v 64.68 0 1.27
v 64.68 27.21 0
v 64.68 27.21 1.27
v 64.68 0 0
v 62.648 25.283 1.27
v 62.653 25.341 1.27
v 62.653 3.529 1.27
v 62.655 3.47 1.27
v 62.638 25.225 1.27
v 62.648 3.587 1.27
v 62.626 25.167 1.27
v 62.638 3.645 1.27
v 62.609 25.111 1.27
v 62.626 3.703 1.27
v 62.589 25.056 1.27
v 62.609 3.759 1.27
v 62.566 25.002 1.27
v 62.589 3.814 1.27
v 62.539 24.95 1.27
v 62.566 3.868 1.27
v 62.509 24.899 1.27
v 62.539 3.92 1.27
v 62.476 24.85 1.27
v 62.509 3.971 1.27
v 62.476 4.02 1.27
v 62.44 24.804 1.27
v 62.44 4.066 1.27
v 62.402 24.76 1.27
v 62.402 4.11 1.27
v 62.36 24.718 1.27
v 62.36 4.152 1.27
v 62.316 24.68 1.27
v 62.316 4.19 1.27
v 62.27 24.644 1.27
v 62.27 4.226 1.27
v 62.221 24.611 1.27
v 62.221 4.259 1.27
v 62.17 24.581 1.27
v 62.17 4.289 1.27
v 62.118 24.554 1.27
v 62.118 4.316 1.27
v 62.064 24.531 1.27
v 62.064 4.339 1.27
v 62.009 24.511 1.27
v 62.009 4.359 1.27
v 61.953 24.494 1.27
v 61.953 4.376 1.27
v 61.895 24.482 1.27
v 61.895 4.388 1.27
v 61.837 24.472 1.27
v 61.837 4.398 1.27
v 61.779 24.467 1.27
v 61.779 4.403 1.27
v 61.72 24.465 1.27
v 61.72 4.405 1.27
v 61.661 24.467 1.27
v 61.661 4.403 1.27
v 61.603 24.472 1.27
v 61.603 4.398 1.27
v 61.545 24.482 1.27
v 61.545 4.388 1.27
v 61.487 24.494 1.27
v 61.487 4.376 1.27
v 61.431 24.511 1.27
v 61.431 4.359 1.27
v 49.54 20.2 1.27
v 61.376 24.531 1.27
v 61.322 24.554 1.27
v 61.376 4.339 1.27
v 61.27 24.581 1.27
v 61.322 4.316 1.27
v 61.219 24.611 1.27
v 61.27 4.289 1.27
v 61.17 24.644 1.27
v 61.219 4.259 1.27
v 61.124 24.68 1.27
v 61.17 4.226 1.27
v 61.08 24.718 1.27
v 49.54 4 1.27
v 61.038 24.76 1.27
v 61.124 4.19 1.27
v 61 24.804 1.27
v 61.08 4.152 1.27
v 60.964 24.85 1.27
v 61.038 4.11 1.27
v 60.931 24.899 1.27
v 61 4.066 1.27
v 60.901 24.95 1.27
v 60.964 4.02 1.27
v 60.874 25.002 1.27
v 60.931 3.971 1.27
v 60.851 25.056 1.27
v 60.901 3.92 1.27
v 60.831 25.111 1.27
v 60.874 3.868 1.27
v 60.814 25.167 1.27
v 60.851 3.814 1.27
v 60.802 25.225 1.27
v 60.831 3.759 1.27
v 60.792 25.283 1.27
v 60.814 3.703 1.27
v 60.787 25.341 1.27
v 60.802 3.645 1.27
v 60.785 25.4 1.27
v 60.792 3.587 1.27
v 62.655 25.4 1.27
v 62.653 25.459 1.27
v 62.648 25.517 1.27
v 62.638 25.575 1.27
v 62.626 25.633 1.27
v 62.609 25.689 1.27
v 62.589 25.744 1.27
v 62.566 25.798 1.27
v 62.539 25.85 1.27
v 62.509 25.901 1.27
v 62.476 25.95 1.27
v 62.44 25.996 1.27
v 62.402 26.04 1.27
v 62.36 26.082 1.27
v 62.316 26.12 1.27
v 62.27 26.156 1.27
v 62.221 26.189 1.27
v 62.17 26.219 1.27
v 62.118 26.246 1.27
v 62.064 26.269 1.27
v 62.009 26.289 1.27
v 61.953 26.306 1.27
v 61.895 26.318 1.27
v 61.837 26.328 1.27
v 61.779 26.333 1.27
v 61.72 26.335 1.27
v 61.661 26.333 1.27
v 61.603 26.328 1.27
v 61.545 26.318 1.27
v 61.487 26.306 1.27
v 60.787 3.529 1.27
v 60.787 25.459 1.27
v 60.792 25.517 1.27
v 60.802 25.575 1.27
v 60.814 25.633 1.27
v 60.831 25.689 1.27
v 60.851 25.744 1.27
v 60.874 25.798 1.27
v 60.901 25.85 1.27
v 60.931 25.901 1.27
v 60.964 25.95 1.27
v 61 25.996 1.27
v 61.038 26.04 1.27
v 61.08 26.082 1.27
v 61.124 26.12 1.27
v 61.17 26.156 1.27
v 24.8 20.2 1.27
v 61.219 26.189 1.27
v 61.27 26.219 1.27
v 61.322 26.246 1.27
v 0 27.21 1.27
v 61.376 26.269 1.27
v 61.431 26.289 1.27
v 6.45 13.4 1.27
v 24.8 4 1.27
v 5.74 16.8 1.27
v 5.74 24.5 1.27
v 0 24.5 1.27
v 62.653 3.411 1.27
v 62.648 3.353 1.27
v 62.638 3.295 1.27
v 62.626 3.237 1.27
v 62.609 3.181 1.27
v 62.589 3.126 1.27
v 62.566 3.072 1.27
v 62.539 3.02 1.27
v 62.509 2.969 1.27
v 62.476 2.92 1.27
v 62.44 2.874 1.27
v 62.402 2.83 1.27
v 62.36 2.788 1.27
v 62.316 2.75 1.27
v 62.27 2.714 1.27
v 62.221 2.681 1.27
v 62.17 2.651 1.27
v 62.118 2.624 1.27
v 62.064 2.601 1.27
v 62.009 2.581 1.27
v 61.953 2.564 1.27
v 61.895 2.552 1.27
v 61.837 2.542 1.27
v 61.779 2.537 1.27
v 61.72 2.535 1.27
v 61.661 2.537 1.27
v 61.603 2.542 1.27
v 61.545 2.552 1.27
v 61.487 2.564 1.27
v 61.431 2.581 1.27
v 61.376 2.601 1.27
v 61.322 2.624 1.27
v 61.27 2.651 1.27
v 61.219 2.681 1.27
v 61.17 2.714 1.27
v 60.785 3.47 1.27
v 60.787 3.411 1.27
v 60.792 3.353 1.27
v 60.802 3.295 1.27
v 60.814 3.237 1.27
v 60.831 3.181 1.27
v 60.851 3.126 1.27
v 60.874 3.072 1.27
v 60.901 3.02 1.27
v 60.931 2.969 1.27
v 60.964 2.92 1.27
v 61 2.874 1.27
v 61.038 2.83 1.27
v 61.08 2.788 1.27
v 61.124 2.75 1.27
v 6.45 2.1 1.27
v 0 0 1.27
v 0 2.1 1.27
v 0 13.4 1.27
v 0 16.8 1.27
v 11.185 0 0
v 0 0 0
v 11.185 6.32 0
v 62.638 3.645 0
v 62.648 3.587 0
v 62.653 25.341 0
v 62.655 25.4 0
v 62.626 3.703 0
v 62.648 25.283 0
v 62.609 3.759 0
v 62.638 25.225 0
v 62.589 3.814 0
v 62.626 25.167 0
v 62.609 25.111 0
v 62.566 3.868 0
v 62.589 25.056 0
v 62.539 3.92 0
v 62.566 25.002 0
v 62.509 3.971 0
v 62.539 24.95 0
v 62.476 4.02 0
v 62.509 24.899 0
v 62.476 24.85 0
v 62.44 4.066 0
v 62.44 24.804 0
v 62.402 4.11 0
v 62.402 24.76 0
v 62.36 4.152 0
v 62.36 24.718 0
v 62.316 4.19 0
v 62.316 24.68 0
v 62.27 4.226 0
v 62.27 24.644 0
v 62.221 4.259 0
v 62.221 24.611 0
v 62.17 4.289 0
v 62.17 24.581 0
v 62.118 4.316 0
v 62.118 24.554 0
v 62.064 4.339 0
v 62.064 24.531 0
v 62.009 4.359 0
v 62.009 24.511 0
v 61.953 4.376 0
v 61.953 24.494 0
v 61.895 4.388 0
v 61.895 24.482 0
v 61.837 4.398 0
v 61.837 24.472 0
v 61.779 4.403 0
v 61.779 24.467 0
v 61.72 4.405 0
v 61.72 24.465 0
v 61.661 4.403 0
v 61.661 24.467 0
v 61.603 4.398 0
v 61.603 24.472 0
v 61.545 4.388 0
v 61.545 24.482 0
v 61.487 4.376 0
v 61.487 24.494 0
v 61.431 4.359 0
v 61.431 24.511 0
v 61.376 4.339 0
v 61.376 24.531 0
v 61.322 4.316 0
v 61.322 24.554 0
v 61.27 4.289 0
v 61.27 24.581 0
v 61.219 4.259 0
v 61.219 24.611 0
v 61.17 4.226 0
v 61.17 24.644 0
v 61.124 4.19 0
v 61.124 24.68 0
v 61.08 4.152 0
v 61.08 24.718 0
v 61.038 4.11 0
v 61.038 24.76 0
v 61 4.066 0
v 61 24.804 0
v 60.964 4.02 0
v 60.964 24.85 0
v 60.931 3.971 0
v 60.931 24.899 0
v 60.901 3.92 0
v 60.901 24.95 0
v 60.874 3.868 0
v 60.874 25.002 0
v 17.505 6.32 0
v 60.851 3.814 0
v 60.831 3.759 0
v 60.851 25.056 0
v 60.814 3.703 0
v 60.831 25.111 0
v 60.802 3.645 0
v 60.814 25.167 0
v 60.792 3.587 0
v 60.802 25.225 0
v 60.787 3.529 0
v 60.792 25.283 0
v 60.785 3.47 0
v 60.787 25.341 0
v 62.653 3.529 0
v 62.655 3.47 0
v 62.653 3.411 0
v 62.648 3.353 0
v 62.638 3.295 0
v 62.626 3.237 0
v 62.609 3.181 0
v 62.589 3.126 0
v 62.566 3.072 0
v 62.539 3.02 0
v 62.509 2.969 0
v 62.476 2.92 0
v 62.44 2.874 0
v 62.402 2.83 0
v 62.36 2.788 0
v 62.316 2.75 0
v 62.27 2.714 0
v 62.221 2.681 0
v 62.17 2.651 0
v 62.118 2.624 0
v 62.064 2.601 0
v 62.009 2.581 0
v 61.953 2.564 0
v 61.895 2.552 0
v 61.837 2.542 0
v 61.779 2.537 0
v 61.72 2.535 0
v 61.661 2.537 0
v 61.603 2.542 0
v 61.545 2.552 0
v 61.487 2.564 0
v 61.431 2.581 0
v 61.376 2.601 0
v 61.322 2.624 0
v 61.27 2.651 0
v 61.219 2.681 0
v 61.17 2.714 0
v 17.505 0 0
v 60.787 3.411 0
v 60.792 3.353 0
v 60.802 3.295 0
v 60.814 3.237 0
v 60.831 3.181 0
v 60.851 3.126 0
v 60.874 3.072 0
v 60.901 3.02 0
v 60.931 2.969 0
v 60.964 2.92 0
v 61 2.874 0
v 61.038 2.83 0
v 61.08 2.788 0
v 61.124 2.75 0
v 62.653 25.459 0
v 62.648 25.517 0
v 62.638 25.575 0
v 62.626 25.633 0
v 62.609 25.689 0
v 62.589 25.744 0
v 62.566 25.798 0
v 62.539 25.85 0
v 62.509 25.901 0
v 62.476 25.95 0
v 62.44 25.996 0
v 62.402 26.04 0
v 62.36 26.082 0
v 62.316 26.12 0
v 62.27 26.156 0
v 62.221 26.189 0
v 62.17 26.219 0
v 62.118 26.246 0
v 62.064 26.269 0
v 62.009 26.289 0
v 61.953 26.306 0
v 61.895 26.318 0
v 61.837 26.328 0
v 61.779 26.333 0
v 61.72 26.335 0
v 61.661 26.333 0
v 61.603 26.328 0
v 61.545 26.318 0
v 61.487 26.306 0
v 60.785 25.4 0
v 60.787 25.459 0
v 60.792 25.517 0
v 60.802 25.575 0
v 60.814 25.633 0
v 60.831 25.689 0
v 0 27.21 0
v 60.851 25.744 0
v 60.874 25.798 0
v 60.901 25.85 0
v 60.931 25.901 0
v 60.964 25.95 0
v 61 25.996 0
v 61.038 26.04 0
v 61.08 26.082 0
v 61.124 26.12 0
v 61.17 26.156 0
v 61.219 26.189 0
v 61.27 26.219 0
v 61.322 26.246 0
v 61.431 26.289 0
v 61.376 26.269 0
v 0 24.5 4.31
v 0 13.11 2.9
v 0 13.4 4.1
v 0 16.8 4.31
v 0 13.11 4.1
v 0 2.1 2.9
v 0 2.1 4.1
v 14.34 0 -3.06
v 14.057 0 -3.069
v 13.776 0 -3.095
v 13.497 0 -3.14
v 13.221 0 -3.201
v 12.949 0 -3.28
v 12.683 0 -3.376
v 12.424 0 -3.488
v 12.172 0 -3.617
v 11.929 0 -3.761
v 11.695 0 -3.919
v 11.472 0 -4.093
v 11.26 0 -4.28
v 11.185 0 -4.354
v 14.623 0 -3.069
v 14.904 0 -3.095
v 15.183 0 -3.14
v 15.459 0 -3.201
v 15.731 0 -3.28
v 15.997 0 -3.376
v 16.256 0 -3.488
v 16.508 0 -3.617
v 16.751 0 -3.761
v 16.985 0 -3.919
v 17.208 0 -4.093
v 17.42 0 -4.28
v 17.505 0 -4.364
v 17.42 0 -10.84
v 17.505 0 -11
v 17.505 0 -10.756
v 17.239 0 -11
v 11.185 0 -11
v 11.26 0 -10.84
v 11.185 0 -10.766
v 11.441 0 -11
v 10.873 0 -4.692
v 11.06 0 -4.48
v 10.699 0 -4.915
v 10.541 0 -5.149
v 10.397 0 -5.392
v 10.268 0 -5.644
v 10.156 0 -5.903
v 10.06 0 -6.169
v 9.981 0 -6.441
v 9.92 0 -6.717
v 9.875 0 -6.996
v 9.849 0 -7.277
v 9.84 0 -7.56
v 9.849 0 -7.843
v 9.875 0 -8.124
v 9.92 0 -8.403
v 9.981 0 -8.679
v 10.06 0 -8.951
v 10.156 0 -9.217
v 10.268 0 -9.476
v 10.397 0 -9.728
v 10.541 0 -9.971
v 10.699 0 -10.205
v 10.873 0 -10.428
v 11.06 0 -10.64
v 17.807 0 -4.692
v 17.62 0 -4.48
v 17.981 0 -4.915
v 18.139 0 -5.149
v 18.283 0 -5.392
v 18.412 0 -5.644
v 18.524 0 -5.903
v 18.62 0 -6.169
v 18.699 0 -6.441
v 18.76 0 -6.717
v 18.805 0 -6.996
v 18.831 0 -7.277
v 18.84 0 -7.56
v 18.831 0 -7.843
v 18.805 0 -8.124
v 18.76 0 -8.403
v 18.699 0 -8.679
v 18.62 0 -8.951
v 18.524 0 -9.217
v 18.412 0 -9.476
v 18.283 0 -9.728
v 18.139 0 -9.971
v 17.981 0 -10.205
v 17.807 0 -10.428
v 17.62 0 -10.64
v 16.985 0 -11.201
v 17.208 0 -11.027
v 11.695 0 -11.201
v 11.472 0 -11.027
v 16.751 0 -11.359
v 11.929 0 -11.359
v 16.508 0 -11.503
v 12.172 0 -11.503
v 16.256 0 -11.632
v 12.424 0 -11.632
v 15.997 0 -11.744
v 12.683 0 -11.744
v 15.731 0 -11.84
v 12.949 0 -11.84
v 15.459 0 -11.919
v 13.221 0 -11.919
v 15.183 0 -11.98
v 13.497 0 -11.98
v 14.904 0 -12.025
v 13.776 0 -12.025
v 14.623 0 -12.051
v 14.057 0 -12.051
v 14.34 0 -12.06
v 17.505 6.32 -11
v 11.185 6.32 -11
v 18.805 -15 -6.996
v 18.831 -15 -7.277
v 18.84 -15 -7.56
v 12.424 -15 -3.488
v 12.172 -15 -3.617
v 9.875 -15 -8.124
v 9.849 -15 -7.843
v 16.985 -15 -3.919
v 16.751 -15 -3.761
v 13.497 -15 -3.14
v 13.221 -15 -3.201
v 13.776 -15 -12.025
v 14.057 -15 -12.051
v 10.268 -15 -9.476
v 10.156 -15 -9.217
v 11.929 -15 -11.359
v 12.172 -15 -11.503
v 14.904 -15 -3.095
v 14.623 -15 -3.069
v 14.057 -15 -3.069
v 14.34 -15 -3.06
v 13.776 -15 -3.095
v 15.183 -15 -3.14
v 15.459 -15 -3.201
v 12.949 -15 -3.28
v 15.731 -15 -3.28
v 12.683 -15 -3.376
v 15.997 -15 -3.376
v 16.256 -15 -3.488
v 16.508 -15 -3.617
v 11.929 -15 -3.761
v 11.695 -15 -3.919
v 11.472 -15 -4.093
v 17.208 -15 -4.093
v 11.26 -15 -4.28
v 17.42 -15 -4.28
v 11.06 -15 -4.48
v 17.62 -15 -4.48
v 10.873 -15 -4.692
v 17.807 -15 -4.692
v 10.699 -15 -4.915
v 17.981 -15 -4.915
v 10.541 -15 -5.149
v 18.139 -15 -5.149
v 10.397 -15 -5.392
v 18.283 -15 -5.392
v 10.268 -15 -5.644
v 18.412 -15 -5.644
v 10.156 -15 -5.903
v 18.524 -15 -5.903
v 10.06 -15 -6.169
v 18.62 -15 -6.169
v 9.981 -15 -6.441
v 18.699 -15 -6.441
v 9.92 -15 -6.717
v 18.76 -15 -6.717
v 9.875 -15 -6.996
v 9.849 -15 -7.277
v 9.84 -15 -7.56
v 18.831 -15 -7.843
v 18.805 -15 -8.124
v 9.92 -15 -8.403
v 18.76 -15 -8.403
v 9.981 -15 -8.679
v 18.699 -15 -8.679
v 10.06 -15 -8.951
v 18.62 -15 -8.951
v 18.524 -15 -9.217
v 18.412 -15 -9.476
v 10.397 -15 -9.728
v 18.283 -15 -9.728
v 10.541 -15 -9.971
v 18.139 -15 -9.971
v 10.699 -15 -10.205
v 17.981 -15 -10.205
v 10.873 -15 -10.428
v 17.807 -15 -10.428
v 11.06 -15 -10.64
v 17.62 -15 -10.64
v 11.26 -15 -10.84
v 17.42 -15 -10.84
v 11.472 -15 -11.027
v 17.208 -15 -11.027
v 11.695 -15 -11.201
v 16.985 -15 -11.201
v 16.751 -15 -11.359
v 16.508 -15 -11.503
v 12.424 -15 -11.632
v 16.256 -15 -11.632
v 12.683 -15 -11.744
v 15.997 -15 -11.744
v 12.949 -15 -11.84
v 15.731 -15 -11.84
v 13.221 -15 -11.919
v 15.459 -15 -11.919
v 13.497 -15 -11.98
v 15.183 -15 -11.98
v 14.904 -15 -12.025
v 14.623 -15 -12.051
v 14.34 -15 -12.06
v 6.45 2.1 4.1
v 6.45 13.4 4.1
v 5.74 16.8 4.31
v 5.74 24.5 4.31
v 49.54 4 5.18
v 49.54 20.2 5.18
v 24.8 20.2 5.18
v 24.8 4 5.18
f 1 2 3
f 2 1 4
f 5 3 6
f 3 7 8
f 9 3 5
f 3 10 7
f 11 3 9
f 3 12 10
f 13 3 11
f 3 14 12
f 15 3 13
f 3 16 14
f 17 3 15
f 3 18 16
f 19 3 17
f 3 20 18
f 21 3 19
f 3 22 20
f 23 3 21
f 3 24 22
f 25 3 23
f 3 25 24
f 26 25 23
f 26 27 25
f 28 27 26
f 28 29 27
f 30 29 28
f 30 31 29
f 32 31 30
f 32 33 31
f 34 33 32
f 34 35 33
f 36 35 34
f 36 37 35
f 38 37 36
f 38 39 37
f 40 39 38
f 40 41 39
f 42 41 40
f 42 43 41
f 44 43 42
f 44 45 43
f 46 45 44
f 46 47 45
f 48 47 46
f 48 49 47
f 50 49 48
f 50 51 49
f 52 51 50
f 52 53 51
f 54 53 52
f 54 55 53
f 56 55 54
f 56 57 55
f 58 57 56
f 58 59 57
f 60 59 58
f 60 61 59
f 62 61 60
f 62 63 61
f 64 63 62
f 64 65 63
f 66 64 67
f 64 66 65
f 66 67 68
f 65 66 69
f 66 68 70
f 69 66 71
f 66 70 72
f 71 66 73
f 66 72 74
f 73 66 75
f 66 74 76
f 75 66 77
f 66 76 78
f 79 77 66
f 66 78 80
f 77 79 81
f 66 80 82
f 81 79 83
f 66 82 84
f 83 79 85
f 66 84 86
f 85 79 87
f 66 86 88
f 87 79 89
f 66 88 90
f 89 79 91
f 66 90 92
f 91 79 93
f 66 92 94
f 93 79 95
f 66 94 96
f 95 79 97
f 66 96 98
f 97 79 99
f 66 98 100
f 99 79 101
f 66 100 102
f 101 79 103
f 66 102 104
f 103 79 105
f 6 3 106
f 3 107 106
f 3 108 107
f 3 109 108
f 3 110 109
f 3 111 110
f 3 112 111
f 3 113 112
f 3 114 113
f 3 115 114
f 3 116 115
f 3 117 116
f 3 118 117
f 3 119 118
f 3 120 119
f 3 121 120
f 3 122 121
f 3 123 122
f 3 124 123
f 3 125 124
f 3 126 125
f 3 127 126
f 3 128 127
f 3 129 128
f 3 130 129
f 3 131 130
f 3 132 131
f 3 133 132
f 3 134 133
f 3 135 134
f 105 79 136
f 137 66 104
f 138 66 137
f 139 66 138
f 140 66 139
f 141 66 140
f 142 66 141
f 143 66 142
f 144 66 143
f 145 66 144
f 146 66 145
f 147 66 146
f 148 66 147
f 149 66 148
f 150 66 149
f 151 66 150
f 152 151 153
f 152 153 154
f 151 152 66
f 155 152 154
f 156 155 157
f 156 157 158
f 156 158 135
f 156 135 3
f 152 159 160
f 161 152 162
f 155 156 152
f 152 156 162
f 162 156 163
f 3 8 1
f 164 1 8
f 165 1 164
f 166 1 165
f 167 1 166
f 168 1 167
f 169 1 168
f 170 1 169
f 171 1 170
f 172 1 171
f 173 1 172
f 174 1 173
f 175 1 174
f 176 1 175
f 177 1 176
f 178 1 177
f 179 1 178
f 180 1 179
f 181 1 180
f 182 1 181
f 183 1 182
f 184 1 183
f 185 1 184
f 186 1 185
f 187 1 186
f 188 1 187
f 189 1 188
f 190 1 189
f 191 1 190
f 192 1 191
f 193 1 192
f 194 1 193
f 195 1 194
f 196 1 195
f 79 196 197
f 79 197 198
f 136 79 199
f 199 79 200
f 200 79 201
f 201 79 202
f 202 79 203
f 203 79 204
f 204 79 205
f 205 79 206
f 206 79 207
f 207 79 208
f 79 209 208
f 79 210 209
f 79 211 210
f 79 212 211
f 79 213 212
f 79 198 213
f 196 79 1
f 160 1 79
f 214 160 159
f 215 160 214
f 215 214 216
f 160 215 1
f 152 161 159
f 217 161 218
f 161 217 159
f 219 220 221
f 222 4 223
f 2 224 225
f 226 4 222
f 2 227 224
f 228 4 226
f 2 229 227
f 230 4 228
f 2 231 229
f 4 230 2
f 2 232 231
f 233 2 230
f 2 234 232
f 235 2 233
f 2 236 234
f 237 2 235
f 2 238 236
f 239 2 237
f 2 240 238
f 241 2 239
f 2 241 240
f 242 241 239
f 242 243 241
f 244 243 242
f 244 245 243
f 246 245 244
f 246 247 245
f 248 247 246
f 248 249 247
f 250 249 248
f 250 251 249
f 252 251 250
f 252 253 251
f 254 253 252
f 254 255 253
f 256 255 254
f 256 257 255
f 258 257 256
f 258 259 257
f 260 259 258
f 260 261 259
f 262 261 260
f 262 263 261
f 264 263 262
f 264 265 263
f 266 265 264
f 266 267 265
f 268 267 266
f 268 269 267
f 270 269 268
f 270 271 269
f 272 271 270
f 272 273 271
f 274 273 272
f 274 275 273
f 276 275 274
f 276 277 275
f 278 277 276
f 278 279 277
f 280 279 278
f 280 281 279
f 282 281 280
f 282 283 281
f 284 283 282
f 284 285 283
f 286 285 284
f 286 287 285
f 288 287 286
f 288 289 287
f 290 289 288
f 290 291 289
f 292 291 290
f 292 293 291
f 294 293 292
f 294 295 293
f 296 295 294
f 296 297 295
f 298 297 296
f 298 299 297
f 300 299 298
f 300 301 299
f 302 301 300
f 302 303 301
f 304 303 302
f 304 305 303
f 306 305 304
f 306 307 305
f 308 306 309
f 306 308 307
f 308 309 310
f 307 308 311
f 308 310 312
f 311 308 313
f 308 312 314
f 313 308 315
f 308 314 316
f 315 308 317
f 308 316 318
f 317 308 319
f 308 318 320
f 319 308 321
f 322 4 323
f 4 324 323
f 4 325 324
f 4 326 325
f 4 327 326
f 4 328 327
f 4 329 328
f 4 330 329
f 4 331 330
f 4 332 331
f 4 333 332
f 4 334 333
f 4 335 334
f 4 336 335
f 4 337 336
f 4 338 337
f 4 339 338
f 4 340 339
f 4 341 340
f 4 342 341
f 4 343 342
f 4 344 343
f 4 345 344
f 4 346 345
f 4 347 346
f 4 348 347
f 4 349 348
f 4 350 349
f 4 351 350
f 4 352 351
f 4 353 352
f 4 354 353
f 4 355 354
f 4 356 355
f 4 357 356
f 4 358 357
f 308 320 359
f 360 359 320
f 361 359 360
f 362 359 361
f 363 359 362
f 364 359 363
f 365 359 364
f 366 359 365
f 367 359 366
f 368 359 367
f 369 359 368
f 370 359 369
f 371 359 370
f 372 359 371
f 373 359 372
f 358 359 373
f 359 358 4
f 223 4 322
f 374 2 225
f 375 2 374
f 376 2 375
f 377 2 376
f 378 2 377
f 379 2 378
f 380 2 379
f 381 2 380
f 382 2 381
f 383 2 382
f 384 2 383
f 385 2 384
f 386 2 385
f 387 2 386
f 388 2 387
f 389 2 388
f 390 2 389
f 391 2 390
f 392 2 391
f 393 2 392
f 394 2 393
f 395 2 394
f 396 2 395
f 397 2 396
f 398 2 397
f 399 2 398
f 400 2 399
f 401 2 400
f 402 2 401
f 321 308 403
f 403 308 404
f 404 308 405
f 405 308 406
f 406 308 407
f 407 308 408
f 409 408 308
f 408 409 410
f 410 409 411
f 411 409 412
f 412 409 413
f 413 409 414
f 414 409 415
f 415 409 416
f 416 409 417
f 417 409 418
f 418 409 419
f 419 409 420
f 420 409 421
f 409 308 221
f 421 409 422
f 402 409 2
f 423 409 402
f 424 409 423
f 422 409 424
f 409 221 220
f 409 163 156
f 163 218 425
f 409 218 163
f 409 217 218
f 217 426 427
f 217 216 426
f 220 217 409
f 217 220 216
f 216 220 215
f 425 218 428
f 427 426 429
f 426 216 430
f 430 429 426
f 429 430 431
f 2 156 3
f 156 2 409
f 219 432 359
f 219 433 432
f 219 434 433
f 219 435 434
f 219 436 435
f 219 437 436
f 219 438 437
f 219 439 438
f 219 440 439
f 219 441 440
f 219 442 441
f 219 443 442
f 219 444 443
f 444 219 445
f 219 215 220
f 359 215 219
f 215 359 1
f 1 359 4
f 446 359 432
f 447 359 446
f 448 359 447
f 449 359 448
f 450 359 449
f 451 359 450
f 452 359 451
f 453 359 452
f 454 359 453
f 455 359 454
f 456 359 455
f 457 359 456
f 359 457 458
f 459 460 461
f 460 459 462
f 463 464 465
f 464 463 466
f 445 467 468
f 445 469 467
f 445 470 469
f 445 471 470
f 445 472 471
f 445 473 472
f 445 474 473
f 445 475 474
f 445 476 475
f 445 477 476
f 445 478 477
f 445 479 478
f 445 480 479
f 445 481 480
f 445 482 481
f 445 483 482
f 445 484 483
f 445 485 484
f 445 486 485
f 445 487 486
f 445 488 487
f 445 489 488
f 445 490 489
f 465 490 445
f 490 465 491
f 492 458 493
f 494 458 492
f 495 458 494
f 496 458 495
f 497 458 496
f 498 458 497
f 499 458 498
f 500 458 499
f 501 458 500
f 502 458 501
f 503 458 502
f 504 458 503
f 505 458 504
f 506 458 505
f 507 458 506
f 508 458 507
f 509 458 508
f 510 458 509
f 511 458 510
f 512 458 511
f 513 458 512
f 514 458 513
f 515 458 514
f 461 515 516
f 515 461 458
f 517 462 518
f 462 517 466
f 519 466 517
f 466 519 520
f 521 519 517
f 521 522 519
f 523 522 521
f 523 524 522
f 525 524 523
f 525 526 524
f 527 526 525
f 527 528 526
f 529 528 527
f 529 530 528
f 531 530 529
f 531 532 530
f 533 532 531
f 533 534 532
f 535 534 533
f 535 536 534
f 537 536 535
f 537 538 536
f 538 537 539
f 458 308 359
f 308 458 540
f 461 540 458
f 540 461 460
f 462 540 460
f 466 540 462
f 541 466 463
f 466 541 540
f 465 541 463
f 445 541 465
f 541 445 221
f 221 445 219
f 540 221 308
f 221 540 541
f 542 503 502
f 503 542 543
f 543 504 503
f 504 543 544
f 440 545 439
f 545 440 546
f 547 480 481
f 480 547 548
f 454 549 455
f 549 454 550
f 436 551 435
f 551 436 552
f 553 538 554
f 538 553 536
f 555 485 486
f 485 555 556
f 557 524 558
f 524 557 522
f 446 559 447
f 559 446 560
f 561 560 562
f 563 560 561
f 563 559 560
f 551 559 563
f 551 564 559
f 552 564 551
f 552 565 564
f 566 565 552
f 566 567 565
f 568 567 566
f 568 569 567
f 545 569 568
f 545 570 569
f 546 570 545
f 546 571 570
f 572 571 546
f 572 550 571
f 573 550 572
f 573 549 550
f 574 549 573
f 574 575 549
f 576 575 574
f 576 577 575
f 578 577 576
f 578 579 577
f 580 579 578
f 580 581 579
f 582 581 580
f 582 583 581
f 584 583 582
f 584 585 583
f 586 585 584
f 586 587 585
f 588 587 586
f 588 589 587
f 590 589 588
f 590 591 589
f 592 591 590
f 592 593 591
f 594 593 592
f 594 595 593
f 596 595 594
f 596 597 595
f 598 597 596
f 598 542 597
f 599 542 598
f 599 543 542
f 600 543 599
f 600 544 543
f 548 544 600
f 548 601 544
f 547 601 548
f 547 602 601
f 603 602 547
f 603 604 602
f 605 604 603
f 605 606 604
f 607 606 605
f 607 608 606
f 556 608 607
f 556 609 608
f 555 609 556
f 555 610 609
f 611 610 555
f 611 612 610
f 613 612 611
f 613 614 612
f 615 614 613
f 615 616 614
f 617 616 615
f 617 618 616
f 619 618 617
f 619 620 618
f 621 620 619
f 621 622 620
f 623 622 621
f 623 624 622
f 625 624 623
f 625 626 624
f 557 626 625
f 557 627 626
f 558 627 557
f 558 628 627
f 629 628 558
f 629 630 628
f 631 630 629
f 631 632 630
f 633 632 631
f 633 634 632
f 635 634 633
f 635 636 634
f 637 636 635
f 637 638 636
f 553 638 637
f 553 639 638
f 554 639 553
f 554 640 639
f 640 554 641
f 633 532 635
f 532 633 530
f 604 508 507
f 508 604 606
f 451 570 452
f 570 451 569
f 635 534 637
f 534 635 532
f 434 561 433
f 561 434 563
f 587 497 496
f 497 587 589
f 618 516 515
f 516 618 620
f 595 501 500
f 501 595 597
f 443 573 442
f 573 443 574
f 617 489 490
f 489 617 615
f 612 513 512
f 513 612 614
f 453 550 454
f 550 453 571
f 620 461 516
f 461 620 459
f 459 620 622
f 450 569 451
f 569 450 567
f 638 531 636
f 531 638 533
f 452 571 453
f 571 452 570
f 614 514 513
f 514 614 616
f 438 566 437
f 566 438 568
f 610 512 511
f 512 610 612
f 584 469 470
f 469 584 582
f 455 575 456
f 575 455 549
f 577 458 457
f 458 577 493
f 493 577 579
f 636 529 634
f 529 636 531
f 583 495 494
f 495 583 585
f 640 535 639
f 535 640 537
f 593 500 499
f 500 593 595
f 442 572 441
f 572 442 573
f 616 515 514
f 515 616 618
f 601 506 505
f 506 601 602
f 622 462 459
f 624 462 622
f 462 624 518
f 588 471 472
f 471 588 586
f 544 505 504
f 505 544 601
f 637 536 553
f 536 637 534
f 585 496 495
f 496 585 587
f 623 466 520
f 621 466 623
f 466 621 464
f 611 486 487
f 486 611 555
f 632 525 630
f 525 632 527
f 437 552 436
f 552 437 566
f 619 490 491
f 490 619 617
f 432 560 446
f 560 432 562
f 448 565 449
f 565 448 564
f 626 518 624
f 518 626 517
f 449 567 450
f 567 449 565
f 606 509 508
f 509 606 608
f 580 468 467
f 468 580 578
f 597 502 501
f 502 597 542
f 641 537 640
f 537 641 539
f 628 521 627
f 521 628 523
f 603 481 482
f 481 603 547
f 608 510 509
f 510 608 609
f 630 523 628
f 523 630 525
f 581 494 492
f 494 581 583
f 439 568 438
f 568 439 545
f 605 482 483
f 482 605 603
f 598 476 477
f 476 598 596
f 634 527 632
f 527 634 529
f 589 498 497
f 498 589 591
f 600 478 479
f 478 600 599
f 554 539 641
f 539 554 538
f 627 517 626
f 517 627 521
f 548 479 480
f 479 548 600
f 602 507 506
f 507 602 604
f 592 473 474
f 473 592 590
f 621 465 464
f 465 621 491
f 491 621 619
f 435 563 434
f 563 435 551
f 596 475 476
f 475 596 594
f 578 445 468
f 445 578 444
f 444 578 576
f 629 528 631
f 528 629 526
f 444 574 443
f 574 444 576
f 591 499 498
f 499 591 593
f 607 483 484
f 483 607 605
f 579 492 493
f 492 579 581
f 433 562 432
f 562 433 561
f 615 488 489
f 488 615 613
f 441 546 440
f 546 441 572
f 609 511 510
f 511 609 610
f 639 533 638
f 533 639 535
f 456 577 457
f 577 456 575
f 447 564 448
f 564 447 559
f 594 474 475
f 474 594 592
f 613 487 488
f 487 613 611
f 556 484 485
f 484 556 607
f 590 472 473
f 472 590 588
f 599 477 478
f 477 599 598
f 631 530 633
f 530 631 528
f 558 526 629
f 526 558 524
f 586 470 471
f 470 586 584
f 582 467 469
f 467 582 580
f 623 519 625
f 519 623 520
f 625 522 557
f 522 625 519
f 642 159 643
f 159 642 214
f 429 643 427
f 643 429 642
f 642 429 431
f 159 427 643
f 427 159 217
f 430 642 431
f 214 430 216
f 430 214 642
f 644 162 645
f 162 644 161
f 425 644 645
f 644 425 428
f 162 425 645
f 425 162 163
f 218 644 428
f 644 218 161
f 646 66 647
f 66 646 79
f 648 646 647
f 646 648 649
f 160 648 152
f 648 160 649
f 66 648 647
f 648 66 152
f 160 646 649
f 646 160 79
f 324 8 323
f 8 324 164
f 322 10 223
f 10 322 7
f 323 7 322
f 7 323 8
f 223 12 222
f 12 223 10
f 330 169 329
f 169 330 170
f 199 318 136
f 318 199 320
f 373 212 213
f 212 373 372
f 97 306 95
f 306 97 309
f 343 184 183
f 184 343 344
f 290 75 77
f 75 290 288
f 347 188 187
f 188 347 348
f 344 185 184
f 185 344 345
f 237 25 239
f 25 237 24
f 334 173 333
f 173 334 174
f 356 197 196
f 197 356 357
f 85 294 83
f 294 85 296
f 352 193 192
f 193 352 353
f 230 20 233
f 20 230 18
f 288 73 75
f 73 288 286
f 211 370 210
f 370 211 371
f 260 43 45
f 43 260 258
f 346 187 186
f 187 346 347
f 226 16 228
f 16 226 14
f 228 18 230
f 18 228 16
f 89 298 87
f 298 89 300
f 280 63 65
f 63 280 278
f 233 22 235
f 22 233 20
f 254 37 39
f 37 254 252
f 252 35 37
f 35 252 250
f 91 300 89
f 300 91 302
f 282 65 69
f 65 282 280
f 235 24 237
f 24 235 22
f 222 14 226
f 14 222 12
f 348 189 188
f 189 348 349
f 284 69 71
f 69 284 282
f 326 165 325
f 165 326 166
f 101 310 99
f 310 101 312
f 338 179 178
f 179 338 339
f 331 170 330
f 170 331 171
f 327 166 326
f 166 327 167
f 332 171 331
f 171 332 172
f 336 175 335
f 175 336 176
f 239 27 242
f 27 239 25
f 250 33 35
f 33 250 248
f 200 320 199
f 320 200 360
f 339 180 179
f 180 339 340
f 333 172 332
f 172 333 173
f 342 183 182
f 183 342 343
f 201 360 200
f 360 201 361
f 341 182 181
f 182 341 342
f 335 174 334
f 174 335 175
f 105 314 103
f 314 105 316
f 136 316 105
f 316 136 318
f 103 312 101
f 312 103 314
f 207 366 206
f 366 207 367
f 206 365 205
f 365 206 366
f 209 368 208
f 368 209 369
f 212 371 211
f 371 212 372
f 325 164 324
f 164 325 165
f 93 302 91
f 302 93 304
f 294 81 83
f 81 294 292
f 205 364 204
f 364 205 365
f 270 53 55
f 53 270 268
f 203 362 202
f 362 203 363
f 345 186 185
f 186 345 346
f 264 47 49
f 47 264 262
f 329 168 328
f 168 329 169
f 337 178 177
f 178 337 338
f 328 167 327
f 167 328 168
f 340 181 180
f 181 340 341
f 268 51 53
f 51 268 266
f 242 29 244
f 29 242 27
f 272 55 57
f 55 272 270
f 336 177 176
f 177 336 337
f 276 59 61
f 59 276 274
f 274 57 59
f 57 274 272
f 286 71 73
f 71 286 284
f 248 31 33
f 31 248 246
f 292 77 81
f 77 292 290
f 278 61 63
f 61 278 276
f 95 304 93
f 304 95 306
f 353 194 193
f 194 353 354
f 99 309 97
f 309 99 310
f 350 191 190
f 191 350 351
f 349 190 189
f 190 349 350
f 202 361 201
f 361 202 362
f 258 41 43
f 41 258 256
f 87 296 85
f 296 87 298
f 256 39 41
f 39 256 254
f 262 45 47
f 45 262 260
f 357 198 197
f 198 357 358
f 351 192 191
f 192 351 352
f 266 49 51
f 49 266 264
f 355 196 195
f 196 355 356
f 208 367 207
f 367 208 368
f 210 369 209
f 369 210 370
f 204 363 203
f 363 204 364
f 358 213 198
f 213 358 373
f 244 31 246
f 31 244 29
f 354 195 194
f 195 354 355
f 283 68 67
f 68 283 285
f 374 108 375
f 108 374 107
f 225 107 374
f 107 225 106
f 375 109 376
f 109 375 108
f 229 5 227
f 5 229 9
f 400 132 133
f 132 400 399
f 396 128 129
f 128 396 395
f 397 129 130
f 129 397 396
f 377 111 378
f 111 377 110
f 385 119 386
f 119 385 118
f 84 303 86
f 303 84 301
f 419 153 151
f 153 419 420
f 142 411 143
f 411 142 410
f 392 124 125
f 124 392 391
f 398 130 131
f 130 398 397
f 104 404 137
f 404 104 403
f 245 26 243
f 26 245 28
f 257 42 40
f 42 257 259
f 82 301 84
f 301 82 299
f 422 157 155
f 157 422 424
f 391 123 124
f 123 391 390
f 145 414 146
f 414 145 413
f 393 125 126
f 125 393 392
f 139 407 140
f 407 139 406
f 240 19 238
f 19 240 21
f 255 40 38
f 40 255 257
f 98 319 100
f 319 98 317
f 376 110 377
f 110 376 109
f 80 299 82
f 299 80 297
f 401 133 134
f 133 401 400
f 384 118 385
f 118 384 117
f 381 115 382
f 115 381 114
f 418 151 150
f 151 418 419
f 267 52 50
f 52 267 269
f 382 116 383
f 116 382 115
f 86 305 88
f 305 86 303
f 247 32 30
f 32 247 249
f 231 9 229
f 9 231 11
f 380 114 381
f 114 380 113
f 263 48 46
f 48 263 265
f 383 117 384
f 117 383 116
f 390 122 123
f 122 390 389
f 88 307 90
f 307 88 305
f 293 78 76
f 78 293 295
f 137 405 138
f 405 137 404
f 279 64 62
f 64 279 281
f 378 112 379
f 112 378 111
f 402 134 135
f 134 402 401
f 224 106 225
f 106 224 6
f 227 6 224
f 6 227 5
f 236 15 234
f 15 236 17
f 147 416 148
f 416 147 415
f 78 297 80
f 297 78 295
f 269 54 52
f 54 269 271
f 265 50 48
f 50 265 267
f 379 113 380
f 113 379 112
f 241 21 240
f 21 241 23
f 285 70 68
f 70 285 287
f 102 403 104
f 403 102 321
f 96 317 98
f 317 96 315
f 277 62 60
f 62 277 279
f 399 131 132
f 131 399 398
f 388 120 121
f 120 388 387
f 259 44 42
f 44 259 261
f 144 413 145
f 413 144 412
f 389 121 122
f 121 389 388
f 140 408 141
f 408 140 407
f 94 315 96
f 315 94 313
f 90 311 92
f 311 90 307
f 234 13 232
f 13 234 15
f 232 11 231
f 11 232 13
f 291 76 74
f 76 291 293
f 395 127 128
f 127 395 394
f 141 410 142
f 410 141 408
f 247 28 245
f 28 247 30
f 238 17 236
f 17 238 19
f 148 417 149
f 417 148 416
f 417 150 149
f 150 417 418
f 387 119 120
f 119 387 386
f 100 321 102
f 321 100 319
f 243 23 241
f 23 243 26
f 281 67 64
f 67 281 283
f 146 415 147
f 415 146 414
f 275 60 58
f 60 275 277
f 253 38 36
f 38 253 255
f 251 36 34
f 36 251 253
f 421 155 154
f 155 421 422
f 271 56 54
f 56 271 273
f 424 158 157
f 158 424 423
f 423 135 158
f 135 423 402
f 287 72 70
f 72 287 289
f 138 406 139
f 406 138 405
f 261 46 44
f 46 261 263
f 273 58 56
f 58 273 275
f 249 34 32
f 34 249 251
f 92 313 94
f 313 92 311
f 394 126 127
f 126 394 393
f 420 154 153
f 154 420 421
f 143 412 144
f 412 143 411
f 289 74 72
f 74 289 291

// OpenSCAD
$fn=100;
length = 64.68;
width = 27.21;
thick = 1.27;
mount_hole_center_x = 2.40;
mount_hold_center_y = 3.25;
mount_hole_diameter = 1.87;
punch_out = 15;

antenna_center_x = 14.34;
antenna_box_x = 6.31;
sma_male_dia_AF = 9;

small_adj = 1;

SD_card_thickness = 1.2;
SD_card_width = 11.13;

SD_carrier_thickness = 2.83;

USB_width = 7.7;
USB_thickness = 3.04;
USB_length = 5.74;

LCD_left = 24.8;
LCD_col = 24.74;
LCD_row = 16.2;
LCD_up = 4.0;
LCD_thick = 3.91;

difference()
{
    union()
    {
        cube([length, width, thick], center = false);
        
        // the rectangular box the antenna sits on
        translate([antenna_center_x - antenna_box_x/2 , 0, -11.0])
        cube([6.32, 6.32, 11.0], center = false);

        // the cylinder that comes out of the box
        translate([antenna_center_x, 0, -7.56])
        rotate([90,0,0])
        #cylinder(punch_out, d=sma_male_dia_AF , center = false);
        
        // SD card carrier
        translate([0, 2.1, thick])
        cube([6.45, 11.3, SD_carrier_thickness], center = false);
 
        // USB carrier
        translate([0, 16.8, thick])
        cube([USB_length, USB_width, USB_thickness]);
        
        // LCD 
        translate([LCD_left, LCD_up, thick])
        cube([LCD_col, LCD_row, LCD_thick], center = false); 
    }
    
    union()
    {
        //drilled holes
        translate([61.72, 3.47, -.001])
        cylinder(h=(thick + small_adj), d= mount_hole_diameter, center = false); 
  
        //drilled holes
        translate([61.72, 25.4, -.001])
        cylinder(h=(thick + small_adj), d= mount_hole_diameter, center = false); 
        
        //punch out reset button 
        translate([22.83, width, -2.10/2])
        rotate([-90, 0, 0])
        #cylinder(h=punch_out, d= mount_hole_diameter, center = false); 

        // SD card 
        translate([-10.1, 1.91, thick + SD_carrier_thickness - SD_card_thickness])  // SD card sits below top of carrier
        #cube([10.1, 11.2, SD_card_thickness], center = false);

    }
}

    //fake out reset button 
    translate([22.83, width, -2.10/2])
    rotate([90, 0, 0])
    #cube([-4.68, -2.56, -1], center = true);
